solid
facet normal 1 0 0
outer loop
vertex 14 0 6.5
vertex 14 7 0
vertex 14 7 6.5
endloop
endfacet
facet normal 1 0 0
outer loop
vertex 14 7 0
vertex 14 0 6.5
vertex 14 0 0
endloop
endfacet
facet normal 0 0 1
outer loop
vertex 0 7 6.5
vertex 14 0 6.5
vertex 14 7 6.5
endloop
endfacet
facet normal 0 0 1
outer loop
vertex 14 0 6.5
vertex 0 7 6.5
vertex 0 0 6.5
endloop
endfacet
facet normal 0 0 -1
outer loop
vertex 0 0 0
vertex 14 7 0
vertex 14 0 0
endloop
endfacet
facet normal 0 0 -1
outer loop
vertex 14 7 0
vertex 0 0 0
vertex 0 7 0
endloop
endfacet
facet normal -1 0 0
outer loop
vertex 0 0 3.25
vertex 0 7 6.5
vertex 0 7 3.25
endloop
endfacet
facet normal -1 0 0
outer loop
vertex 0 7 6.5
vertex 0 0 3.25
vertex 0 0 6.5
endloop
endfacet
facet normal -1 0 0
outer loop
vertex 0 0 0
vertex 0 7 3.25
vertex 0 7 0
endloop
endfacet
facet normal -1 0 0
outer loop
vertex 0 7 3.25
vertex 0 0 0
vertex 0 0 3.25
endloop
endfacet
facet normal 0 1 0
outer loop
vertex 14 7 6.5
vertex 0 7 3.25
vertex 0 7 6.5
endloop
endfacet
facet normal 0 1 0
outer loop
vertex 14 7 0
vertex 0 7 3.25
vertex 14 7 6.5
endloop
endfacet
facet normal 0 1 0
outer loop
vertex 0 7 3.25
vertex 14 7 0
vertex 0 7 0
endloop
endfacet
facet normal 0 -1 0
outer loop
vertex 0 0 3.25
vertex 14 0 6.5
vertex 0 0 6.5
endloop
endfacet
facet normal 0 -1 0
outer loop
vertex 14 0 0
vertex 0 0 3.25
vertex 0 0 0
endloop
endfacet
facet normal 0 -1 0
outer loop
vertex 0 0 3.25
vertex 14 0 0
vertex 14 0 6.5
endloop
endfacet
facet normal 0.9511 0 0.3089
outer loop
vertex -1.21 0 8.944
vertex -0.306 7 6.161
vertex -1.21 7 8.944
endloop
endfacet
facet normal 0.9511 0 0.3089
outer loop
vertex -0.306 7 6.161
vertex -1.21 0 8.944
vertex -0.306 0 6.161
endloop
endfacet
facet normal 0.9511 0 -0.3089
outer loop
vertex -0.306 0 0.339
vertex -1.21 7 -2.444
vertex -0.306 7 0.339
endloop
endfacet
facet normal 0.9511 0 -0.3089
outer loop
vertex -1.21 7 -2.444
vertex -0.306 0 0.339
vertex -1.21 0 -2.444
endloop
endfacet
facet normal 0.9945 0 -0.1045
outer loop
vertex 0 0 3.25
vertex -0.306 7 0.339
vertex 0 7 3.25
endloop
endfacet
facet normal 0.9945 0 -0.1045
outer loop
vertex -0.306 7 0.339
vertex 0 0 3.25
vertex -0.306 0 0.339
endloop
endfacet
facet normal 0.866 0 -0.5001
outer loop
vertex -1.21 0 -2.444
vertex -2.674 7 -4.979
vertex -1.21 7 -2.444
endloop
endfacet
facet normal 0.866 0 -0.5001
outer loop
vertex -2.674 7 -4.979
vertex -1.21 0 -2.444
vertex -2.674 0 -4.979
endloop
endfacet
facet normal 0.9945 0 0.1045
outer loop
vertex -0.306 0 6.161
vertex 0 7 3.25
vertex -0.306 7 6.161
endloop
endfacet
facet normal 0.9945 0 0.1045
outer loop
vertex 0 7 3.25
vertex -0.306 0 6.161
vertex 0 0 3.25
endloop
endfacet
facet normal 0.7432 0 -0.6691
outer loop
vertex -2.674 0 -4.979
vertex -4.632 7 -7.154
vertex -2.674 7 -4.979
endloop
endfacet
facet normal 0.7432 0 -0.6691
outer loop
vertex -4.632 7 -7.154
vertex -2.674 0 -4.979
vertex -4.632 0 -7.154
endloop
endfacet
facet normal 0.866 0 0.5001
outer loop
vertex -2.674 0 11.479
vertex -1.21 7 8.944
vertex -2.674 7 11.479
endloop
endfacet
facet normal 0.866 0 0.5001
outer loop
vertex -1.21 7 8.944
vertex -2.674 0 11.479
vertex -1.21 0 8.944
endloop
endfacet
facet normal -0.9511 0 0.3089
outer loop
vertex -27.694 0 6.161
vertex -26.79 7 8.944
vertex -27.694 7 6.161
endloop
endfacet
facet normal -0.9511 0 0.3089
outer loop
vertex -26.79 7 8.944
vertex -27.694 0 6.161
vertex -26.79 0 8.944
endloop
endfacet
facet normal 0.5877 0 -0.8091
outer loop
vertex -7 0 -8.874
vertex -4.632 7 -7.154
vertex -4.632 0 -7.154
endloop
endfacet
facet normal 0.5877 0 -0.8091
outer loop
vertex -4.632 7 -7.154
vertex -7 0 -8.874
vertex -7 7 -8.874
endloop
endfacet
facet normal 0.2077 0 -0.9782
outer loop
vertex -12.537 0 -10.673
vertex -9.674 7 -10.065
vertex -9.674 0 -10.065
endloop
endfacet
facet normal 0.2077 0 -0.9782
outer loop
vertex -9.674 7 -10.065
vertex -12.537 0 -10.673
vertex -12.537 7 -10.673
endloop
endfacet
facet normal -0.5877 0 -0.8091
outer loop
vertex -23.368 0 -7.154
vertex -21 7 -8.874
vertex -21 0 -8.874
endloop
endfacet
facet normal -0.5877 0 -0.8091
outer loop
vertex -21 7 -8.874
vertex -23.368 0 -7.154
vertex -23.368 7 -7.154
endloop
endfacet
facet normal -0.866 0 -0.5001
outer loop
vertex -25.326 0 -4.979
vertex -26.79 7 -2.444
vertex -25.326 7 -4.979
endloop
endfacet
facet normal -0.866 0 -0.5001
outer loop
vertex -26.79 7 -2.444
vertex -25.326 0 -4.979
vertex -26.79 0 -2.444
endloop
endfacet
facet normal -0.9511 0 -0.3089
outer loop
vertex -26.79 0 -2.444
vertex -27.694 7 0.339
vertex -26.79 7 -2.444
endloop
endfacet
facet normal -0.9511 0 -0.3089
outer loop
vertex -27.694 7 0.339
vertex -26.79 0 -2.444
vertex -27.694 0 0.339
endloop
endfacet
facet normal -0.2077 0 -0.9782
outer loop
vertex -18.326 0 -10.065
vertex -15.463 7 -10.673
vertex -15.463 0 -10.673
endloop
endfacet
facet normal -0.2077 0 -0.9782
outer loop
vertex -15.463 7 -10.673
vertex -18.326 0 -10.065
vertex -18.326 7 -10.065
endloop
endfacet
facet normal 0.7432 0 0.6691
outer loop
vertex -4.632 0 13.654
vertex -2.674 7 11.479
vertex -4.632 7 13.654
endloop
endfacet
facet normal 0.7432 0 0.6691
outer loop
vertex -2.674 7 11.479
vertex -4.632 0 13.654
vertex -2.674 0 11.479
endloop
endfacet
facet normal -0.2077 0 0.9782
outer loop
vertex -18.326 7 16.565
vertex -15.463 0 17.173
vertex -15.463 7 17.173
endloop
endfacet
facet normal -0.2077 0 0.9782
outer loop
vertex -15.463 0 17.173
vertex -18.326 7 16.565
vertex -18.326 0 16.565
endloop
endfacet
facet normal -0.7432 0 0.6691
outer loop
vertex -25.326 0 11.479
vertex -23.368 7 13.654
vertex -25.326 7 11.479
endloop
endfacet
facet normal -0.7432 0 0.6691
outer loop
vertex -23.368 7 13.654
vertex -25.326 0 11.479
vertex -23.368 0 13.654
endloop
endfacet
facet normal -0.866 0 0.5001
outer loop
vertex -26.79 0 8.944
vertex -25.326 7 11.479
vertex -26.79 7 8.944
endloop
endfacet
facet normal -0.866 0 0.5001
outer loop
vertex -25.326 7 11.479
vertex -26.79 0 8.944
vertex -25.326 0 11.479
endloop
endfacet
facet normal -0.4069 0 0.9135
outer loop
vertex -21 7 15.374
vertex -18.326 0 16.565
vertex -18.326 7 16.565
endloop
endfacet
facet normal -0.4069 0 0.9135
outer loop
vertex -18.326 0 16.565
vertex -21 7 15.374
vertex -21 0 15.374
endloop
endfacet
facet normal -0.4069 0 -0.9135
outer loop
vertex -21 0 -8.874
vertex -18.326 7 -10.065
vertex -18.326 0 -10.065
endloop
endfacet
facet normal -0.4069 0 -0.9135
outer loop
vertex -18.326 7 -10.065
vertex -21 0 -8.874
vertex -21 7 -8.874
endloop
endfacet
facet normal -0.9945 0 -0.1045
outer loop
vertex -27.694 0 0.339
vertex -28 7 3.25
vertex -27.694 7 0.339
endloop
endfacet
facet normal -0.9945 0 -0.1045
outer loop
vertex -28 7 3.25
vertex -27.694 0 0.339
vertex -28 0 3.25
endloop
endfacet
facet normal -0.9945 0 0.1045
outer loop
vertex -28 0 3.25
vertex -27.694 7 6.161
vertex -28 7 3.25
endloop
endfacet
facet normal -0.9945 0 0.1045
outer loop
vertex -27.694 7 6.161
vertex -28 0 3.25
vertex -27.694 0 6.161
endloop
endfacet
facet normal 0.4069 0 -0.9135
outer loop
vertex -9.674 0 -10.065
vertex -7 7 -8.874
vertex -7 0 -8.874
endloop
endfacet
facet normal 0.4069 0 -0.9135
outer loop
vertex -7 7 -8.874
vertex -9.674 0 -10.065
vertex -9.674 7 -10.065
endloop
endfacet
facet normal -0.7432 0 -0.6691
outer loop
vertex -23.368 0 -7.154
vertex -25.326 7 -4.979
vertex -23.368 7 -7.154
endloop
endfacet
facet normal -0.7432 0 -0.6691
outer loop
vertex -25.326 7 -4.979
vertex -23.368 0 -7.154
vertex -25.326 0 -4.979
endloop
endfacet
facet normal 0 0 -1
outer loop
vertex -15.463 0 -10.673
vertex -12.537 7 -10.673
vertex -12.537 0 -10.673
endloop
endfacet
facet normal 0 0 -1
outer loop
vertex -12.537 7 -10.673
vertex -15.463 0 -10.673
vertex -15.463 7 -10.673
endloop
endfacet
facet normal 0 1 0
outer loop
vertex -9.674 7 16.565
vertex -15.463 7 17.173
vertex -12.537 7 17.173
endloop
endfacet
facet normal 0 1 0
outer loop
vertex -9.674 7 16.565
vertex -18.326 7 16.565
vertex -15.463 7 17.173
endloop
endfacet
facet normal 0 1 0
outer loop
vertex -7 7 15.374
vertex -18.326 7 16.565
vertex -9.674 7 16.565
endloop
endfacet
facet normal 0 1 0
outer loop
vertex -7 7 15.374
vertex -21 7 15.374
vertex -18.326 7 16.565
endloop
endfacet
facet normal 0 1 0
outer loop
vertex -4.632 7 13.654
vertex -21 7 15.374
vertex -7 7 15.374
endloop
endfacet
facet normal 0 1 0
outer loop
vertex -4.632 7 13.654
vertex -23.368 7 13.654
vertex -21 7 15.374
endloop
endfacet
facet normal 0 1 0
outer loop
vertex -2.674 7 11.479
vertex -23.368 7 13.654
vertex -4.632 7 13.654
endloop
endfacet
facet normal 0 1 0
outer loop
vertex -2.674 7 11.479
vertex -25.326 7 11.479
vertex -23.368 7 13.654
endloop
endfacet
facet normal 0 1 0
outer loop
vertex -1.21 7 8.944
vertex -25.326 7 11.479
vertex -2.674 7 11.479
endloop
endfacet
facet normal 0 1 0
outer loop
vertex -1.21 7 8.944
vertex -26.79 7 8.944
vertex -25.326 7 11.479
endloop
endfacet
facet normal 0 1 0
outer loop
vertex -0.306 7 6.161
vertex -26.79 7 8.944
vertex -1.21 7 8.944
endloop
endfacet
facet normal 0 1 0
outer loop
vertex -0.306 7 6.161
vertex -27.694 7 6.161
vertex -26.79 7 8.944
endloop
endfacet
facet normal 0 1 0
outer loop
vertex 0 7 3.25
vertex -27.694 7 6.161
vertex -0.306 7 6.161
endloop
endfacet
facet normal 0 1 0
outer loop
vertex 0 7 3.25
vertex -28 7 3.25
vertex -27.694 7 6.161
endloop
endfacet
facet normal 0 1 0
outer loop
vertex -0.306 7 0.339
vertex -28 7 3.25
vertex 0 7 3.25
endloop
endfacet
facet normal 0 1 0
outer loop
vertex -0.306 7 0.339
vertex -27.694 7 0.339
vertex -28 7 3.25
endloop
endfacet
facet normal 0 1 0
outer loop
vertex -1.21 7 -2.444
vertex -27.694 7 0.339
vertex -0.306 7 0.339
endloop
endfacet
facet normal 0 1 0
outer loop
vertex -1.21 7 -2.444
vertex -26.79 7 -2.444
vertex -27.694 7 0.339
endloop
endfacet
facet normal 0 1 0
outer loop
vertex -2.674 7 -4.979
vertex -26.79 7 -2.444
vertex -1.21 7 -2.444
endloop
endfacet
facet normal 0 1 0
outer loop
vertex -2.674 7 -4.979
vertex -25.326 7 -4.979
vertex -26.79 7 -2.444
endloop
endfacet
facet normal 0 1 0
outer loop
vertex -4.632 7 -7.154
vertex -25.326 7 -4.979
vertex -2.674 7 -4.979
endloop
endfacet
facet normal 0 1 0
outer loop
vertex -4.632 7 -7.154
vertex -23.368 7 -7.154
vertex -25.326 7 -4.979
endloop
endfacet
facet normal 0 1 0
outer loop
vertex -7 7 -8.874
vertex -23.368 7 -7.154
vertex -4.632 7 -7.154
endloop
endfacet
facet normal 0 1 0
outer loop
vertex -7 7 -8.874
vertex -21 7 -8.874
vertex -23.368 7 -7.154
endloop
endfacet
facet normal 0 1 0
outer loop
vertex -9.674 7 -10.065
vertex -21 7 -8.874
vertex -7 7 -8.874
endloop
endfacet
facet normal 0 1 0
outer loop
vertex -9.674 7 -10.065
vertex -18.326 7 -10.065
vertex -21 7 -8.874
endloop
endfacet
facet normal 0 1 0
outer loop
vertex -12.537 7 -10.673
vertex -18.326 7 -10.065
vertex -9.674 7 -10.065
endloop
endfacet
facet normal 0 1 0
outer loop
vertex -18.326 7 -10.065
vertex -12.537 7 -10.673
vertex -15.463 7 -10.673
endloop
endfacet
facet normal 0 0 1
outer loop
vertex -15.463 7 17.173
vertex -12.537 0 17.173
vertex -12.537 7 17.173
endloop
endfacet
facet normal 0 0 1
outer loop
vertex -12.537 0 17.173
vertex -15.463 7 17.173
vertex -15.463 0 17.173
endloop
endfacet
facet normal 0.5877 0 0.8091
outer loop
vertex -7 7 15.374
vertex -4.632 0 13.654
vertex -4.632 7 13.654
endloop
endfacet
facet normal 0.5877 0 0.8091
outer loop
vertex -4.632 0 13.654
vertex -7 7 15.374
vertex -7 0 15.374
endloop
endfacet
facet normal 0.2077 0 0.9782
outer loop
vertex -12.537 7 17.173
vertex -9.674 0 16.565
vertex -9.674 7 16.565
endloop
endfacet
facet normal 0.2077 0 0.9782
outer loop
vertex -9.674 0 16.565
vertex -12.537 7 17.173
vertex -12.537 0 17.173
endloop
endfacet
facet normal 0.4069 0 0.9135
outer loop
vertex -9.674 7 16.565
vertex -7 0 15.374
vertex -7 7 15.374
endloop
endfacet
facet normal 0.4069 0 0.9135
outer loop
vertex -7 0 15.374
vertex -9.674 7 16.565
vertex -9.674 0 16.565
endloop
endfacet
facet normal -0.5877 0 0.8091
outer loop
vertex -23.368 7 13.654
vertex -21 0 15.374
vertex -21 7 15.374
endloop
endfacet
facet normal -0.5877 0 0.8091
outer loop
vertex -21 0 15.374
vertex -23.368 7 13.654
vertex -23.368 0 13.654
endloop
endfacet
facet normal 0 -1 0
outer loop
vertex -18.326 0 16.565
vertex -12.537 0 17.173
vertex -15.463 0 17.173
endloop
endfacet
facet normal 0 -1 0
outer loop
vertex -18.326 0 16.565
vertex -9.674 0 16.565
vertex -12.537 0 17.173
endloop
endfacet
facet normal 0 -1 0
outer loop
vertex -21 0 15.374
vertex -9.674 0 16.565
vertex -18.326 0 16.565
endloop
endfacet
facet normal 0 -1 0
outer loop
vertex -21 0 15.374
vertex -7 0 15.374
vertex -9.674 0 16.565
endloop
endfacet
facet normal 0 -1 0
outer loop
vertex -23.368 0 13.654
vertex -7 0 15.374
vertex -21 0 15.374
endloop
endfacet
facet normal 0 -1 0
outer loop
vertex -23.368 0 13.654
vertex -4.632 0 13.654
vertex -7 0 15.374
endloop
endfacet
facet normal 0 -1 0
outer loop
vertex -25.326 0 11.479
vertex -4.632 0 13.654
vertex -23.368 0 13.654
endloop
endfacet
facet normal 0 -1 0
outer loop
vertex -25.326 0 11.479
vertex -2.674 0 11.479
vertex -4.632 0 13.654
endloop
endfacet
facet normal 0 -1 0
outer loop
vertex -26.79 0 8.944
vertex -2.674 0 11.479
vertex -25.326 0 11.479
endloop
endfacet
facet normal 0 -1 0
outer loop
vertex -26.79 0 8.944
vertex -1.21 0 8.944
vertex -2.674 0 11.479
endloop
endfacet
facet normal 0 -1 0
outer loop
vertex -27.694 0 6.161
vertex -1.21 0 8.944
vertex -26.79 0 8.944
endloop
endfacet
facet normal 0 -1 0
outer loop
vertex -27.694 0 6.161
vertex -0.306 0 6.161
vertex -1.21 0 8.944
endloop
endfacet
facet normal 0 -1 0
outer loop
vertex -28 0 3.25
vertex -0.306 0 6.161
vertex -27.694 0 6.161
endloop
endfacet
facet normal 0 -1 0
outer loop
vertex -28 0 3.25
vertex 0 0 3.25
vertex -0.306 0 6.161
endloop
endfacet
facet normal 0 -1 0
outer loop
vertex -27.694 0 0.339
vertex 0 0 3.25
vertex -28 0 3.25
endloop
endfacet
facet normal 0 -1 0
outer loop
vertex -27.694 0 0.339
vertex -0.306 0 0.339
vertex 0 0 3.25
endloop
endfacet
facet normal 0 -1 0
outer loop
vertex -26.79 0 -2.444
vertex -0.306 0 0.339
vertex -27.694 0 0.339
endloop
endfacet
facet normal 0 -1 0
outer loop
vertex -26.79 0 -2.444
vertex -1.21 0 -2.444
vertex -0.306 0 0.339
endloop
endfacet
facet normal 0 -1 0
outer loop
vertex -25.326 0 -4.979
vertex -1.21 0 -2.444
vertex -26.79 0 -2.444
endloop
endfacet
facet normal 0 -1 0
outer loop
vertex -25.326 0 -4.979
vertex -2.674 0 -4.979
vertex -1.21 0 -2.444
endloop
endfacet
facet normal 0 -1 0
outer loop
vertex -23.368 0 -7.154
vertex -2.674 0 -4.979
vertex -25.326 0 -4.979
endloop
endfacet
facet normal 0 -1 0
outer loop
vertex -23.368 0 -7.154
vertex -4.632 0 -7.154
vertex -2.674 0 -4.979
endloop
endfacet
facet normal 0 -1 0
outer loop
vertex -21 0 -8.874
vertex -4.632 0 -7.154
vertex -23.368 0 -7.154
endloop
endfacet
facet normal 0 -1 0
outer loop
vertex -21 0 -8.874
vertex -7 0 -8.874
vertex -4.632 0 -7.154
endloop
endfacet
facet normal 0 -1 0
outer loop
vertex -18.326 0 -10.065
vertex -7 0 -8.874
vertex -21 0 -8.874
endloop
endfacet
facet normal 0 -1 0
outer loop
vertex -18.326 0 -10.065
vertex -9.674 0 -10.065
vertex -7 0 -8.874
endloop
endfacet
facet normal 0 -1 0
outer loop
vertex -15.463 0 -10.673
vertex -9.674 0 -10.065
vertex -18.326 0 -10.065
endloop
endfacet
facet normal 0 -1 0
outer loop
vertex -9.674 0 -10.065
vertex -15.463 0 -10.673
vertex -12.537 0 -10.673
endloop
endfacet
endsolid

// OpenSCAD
// These are the rough millimeter measurements of a light switch.
switchLength = 6.5;
switchWidth = 7;
switchDepth = 14;

module switch(switchLength, switchWidth, switchDepth){
    cylinderRadius = switchDepth;

    union(){
        cube([switchDepth, switchWidth, switchLength]);
        translate([-cylinderRadius, 0, switchLength/2]){
            rotate([270, 0, 0]){
                cylinder(r1=cylinderRadius, r2=cylinderRadius, h=switchWidth);
            }
        }
    }
}

switch(switchLength, switchWidth, switchDepth);
